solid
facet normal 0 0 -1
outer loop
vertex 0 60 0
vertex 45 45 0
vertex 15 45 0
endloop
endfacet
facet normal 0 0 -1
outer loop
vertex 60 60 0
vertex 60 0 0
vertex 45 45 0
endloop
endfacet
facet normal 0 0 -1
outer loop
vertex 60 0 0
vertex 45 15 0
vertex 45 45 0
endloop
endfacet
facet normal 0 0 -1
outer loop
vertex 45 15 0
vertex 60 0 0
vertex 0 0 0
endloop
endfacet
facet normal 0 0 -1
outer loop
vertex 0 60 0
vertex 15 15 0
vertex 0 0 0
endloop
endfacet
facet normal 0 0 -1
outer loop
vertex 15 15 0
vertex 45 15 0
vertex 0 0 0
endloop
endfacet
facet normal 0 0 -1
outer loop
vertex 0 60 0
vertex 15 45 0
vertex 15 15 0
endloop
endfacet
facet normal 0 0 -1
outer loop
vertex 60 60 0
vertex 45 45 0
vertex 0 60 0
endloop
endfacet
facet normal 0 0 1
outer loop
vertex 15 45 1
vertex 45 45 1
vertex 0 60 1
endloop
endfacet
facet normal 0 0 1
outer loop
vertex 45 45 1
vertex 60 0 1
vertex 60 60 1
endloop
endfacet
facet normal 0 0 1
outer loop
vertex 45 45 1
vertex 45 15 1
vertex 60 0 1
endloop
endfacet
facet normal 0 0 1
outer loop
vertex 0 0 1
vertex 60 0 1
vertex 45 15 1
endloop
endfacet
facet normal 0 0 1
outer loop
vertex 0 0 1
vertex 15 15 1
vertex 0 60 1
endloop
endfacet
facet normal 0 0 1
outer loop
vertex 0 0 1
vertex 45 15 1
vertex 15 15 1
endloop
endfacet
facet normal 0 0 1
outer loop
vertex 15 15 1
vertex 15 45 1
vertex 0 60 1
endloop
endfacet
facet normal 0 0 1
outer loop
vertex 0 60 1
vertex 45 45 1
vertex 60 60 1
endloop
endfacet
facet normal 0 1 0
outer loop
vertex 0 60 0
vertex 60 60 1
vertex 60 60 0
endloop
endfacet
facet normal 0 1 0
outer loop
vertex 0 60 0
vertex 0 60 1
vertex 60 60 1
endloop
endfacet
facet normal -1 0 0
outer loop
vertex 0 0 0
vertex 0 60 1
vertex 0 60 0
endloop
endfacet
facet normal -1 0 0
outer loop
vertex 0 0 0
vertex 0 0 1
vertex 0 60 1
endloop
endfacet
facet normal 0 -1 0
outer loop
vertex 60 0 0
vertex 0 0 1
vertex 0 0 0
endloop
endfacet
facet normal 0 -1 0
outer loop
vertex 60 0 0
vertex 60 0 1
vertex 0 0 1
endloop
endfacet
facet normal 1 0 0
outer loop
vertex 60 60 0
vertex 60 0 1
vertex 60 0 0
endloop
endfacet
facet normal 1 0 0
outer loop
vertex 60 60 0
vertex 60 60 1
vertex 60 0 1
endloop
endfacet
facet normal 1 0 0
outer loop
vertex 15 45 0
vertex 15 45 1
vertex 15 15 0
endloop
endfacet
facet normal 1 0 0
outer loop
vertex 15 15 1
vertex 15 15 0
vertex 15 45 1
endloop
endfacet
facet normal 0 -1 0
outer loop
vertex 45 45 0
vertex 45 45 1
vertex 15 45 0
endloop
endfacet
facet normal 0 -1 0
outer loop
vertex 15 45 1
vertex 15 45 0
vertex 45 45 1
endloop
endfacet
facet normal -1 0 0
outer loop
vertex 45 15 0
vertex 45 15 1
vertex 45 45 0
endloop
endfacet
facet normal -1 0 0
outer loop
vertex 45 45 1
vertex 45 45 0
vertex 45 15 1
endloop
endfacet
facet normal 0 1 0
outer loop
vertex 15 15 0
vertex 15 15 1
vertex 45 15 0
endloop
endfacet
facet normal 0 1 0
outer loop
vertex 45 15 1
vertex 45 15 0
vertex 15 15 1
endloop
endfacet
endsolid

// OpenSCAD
points = [
    // Contorno externo
    [0,0],     //0
    [60,0],    //1
    [60,60],   //2
    [0,60],    //3

    // Contorno interno
    [15,15],   //4
    [45,15],   //5
    [45,45],   //6
    [15,45]    //7
];
linear_extrude(height=1)
    polygon(
        points=points,
        paths = [
        [0,1,2,3],    // contorno externo
        [7,6,5,4]     // contorno interno (invertido)
    ]
);
